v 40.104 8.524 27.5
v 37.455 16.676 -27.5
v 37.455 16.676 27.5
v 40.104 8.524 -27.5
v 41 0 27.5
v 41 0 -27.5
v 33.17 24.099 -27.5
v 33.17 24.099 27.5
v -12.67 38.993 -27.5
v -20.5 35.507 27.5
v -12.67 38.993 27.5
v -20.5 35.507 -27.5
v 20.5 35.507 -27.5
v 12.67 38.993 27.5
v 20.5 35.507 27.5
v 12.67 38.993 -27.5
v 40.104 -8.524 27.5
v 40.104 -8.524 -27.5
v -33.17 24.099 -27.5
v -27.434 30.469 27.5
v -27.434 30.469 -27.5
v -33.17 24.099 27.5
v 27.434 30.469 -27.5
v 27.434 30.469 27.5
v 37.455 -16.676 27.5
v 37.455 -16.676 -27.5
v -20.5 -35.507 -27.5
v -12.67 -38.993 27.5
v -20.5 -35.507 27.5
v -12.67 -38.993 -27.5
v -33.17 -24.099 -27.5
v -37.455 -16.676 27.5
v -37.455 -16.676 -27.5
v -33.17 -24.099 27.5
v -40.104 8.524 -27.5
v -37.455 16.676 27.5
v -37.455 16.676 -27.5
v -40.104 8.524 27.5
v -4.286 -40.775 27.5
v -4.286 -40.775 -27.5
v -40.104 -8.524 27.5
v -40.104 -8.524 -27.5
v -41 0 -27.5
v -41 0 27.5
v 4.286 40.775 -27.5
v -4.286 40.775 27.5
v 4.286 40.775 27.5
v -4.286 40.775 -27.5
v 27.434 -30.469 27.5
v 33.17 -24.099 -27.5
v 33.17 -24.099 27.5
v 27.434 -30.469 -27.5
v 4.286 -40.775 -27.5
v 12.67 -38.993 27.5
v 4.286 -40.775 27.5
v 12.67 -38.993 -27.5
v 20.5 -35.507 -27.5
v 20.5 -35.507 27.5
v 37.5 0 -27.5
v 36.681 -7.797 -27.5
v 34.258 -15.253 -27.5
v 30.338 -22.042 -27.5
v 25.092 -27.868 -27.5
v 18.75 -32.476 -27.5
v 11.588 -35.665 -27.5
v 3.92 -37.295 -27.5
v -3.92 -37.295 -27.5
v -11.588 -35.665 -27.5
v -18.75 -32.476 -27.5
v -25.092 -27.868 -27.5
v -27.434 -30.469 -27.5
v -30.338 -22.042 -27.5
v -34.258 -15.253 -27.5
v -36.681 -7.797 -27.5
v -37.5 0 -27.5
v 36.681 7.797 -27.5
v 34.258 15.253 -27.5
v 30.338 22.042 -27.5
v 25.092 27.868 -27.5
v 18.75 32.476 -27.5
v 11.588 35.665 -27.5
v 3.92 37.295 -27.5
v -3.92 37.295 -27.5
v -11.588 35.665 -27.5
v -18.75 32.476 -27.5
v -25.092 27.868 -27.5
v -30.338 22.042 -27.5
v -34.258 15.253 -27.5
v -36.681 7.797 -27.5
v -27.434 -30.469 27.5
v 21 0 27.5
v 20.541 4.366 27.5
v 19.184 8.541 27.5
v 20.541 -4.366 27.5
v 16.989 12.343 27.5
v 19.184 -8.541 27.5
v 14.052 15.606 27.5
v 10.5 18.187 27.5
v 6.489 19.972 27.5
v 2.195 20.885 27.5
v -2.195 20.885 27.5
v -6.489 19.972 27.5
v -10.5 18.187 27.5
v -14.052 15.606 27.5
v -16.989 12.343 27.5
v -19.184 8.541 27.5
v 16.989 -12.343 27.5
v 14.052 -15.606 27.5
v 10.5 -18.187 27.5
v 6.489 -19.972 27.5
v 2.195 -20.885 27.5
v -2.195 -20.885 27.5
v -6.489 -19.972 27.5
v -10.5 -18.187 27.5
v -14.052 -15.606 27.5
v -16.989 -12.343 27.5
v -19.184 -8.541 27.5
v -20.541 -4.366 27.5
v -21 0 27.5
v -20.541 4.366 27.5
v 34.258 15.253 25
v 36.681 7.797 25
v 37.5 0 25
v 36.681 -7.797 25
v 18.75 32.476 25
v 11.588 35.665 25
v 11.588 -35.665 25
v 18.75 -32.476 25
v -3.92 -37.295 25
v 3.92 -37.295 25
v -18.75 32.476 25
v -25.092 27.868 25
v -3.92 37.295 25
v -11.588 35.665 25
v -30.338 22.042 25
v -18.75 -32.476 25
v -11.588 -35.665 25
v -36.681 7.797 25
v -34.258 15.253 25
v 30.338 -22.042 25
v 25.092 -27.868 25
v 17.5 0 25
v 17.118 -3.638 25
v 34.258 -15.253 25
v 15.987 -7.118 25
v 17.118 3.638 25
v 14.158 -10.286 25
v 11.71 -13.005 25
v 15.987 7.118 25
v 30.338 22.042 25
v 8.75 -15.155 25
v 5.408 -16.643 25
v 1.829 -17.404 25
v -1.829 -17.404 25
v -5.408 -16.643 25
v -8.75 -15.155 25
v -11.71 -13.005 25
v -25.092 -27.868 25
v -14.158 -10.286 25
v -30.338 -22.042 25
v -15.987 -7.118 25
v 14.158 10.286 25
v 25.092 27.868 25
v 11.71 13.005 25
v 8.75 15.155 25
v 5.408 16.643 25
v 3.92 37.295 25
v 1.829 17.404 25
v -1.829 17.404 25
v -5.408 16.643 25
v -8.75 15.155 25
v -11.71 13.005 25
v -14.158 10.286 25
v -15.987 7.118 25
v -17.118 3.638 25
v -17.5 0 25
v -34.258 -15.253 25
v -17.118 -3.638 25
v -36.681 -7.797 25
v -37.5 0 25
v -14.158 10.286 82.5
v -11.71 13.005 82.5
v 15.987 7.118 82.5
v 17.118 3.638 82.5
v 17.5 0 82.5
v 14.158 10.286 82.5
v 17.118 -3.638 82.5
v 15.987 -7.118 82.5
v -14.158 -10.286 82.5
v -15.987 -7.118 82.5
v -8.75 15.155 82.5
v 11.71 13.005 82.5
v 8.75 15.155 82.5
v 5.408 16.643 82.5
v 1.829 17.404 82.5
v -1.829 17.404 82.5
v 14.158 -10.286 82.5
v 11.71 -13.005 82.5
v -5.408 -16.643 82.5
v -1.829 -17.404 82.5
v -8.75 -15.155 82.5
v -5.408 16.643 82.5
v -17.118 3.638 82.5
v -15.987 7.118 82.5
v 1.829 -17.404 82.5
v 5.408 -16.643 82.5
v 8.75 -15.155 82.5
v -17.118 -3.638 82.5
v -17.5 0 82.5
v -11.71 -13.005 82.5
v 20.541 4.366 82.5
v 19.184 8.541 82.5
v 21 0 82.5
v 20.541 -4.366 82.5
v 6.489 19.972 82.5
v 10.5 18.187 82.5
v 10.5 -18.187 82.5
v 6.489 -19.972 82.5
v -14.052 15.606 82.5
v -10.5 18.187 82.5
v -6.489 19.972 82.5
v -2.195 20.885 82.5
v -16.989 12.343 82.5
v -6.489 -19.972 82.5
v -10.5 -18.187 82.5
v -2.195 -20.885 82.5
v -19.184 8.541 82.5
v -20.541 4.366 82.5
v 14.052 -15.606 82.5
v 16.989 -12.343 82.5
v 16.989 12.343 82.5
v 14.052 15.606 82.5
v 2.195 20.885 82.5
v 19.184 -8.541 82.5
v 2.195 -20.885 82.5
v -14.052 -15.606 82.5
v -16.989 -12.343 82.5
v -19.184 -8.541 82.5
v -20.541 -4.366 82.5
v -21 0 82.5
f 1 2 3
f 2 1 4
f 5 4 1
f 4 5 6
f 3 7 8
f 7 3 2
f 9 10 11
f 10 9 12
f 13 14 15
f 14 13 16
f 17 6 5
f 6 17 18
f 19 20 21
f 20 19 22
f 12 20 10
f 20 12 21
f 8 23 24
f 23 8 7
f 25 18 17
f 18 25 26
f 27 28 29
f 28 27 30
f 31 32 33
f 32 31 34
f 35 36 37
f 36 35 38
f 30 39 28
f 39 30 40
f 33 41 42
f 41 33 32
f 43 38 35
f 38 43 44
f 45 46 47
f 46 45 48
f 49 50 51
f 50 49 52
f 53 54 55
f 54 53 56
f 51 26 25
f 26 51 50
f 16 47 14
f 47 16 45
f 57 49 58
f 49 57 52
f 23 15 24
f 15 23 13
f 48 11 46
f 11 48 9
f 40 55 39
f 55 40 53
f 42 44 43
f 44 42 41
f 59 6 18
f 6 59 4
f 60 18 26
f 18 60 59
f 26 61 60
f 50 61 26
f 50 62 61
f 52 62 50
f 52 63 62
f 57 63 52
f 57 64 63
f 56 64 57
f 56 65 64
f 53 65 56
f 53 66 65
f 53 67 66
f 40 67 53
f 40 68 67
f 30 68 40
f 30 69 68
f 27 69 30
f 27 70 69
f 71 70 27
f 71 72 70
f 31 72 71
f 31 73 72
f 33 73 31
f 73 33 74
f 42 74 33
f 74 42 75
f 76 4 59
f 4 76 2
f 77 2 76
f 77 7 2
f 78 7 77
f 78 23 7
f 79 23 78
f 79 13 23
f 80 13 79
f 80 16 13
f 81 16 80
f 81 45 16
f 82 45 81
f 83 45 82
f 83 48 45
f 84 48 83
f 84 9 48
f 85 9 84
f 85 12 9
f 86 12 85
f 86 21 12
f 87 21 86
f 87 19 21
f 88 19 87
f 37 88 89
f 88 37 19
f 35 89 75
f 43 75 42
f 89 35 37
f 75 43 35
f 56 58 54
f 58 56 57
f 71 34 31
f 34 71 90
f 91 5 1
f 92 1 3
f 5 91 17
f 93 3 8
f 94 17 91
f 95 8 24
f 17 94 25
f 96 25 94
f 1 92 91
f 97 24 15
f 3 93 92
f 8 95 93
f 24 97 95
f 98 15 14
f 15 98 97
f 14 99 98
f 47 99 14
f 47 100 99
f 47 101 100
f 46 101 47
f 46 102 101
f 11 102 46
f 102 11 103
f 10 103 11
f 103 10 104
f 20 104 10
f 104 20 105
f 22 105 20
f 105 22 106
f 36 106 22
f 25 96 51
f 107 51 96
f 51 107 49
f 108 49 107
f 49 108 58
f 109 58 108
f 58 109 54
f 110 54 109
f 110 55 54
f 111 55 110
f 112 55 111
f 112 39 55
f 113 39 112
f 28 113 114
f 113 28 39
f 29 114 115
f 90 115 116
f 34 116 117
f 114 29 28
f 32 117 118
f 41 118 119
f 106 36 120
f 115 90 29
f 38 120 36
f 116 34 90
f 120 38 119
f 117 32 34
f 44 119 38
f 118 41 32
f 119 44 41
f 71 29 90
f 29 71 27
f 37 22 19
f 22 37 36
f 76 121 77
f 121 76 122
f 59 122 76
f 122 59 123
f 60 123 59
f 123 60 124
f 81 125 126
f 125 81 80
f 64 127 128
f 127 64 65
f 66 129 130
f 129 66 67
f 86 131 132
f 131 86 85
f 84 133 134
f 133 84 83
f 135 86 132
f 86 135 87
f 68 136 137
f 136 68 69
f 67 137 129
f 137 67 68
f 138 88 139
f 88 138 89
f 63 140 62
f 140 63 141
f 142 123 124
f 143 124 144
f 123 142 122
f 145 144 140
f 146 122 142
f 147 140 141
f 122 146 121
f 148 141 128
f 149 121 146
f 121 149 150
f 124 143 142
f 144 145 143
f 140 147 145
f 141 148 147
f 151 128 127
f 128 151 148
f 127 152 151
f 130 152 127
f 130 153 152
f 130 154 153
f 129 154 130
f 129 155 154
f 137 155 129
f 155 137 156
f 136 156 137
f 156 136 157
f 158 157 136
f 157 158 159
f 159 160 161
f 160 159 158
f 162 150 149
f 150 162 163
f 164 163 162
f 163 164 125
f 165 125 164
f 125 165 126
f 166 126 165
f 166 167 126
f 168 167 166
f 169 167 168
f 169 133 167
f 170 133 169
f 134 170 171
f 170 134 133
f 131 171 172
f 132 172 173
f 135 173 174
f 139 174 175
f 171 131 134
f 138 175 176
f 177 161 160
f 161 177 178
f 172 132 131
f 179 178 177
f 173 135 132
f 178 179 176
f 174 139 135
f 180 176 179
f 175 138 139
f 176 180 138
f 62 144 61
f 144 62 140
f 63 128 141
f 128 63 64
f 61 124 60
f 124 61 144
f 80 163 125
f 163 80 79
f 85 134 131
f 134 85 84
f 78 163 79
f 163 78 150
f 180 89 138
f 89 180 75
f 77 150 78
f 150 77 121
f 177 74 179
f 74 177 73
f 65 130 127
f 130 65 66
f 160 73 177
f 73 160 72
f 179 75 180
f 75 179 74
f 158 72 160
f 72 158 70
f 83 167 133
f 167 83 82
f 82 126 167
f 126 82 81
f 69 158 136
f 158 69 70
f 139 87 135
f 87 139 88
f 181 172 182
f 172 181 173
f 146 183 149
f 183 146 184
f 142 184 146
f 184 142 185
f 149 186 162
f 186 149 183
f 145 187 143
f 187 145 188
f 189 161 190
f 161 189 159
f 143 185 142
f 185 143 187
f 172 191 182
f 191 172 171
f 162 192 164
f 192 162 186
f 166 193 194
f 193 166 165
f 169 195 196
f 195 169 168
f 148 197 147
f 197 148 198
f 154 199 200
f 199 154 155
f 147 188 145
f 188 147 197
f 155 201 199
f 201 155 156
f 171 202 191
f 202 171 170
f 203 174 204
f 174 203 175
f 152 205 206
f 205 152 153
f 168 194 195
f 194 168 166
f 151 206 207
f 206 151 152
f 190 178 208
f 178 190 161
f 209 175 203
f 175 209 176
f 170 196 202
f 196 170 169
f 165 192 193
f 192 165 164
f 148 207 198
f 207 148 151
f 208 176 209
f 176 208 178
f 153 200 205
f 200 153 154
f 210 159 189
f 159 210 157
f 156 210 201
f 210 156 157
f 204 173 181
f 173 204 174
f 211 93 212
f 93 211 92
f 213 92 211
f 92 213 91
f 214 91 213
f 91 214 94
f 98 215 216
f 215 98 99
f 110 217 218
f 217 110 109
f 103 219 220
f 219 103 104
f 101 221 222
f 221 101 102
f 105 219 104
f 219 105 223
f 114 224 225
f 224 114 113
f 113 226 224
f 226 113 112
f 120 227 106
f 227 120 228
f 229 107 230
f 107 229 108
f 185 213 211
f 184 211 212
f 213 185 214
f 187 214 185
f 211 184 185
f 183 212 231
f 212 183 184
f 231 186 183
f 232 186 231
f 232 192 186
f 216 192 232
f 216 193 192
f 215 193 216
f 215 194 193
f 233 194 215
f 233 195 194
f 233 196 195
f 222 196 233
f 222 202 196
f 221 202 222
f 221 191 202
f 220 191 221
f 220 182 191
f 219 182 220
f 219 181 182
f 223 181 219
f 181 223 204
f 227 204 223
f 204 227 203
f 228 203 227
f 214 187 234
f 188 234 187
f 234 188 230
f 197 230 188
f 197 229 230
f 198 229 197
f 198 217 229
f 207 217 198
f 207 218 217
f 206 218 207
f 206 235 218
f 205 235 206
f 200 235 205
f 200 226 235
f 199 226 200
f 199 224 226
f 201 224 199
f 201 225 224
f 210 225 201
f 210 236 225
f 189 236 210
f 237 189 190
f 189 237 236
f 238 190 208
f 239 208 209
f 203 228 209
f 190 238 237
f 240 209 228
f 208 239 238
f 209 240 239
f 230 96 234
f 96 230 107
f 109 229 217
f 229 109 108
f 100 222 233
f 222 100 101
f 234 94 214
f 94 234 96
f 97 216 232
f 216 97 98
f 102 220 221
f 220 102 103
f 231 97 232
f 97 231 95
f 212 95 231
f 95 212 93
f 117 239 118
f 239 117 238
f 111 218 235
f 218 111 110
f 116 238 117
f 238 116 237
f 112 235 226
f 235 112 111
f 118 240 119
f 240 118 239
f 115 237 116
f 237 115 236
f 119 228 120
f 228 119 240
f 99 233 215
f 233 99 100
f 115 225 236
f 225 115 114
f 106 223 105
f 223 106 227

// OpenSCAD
difference() {
	cylinder(h = 55, r=41, center=true);
	translate([0,0,-5]) cylinder(h = 60, r=37.5, center=true);
	translate([0,0,-5]) cylinder(h = 90, r=17.5, center=true);
}

translate([0,0,55]) difference() {
	cylinder(h = 55, r=21, center=true);
	translate([0,0,-5]) cylinder(h = 80, r=17.5, center=true);

}
